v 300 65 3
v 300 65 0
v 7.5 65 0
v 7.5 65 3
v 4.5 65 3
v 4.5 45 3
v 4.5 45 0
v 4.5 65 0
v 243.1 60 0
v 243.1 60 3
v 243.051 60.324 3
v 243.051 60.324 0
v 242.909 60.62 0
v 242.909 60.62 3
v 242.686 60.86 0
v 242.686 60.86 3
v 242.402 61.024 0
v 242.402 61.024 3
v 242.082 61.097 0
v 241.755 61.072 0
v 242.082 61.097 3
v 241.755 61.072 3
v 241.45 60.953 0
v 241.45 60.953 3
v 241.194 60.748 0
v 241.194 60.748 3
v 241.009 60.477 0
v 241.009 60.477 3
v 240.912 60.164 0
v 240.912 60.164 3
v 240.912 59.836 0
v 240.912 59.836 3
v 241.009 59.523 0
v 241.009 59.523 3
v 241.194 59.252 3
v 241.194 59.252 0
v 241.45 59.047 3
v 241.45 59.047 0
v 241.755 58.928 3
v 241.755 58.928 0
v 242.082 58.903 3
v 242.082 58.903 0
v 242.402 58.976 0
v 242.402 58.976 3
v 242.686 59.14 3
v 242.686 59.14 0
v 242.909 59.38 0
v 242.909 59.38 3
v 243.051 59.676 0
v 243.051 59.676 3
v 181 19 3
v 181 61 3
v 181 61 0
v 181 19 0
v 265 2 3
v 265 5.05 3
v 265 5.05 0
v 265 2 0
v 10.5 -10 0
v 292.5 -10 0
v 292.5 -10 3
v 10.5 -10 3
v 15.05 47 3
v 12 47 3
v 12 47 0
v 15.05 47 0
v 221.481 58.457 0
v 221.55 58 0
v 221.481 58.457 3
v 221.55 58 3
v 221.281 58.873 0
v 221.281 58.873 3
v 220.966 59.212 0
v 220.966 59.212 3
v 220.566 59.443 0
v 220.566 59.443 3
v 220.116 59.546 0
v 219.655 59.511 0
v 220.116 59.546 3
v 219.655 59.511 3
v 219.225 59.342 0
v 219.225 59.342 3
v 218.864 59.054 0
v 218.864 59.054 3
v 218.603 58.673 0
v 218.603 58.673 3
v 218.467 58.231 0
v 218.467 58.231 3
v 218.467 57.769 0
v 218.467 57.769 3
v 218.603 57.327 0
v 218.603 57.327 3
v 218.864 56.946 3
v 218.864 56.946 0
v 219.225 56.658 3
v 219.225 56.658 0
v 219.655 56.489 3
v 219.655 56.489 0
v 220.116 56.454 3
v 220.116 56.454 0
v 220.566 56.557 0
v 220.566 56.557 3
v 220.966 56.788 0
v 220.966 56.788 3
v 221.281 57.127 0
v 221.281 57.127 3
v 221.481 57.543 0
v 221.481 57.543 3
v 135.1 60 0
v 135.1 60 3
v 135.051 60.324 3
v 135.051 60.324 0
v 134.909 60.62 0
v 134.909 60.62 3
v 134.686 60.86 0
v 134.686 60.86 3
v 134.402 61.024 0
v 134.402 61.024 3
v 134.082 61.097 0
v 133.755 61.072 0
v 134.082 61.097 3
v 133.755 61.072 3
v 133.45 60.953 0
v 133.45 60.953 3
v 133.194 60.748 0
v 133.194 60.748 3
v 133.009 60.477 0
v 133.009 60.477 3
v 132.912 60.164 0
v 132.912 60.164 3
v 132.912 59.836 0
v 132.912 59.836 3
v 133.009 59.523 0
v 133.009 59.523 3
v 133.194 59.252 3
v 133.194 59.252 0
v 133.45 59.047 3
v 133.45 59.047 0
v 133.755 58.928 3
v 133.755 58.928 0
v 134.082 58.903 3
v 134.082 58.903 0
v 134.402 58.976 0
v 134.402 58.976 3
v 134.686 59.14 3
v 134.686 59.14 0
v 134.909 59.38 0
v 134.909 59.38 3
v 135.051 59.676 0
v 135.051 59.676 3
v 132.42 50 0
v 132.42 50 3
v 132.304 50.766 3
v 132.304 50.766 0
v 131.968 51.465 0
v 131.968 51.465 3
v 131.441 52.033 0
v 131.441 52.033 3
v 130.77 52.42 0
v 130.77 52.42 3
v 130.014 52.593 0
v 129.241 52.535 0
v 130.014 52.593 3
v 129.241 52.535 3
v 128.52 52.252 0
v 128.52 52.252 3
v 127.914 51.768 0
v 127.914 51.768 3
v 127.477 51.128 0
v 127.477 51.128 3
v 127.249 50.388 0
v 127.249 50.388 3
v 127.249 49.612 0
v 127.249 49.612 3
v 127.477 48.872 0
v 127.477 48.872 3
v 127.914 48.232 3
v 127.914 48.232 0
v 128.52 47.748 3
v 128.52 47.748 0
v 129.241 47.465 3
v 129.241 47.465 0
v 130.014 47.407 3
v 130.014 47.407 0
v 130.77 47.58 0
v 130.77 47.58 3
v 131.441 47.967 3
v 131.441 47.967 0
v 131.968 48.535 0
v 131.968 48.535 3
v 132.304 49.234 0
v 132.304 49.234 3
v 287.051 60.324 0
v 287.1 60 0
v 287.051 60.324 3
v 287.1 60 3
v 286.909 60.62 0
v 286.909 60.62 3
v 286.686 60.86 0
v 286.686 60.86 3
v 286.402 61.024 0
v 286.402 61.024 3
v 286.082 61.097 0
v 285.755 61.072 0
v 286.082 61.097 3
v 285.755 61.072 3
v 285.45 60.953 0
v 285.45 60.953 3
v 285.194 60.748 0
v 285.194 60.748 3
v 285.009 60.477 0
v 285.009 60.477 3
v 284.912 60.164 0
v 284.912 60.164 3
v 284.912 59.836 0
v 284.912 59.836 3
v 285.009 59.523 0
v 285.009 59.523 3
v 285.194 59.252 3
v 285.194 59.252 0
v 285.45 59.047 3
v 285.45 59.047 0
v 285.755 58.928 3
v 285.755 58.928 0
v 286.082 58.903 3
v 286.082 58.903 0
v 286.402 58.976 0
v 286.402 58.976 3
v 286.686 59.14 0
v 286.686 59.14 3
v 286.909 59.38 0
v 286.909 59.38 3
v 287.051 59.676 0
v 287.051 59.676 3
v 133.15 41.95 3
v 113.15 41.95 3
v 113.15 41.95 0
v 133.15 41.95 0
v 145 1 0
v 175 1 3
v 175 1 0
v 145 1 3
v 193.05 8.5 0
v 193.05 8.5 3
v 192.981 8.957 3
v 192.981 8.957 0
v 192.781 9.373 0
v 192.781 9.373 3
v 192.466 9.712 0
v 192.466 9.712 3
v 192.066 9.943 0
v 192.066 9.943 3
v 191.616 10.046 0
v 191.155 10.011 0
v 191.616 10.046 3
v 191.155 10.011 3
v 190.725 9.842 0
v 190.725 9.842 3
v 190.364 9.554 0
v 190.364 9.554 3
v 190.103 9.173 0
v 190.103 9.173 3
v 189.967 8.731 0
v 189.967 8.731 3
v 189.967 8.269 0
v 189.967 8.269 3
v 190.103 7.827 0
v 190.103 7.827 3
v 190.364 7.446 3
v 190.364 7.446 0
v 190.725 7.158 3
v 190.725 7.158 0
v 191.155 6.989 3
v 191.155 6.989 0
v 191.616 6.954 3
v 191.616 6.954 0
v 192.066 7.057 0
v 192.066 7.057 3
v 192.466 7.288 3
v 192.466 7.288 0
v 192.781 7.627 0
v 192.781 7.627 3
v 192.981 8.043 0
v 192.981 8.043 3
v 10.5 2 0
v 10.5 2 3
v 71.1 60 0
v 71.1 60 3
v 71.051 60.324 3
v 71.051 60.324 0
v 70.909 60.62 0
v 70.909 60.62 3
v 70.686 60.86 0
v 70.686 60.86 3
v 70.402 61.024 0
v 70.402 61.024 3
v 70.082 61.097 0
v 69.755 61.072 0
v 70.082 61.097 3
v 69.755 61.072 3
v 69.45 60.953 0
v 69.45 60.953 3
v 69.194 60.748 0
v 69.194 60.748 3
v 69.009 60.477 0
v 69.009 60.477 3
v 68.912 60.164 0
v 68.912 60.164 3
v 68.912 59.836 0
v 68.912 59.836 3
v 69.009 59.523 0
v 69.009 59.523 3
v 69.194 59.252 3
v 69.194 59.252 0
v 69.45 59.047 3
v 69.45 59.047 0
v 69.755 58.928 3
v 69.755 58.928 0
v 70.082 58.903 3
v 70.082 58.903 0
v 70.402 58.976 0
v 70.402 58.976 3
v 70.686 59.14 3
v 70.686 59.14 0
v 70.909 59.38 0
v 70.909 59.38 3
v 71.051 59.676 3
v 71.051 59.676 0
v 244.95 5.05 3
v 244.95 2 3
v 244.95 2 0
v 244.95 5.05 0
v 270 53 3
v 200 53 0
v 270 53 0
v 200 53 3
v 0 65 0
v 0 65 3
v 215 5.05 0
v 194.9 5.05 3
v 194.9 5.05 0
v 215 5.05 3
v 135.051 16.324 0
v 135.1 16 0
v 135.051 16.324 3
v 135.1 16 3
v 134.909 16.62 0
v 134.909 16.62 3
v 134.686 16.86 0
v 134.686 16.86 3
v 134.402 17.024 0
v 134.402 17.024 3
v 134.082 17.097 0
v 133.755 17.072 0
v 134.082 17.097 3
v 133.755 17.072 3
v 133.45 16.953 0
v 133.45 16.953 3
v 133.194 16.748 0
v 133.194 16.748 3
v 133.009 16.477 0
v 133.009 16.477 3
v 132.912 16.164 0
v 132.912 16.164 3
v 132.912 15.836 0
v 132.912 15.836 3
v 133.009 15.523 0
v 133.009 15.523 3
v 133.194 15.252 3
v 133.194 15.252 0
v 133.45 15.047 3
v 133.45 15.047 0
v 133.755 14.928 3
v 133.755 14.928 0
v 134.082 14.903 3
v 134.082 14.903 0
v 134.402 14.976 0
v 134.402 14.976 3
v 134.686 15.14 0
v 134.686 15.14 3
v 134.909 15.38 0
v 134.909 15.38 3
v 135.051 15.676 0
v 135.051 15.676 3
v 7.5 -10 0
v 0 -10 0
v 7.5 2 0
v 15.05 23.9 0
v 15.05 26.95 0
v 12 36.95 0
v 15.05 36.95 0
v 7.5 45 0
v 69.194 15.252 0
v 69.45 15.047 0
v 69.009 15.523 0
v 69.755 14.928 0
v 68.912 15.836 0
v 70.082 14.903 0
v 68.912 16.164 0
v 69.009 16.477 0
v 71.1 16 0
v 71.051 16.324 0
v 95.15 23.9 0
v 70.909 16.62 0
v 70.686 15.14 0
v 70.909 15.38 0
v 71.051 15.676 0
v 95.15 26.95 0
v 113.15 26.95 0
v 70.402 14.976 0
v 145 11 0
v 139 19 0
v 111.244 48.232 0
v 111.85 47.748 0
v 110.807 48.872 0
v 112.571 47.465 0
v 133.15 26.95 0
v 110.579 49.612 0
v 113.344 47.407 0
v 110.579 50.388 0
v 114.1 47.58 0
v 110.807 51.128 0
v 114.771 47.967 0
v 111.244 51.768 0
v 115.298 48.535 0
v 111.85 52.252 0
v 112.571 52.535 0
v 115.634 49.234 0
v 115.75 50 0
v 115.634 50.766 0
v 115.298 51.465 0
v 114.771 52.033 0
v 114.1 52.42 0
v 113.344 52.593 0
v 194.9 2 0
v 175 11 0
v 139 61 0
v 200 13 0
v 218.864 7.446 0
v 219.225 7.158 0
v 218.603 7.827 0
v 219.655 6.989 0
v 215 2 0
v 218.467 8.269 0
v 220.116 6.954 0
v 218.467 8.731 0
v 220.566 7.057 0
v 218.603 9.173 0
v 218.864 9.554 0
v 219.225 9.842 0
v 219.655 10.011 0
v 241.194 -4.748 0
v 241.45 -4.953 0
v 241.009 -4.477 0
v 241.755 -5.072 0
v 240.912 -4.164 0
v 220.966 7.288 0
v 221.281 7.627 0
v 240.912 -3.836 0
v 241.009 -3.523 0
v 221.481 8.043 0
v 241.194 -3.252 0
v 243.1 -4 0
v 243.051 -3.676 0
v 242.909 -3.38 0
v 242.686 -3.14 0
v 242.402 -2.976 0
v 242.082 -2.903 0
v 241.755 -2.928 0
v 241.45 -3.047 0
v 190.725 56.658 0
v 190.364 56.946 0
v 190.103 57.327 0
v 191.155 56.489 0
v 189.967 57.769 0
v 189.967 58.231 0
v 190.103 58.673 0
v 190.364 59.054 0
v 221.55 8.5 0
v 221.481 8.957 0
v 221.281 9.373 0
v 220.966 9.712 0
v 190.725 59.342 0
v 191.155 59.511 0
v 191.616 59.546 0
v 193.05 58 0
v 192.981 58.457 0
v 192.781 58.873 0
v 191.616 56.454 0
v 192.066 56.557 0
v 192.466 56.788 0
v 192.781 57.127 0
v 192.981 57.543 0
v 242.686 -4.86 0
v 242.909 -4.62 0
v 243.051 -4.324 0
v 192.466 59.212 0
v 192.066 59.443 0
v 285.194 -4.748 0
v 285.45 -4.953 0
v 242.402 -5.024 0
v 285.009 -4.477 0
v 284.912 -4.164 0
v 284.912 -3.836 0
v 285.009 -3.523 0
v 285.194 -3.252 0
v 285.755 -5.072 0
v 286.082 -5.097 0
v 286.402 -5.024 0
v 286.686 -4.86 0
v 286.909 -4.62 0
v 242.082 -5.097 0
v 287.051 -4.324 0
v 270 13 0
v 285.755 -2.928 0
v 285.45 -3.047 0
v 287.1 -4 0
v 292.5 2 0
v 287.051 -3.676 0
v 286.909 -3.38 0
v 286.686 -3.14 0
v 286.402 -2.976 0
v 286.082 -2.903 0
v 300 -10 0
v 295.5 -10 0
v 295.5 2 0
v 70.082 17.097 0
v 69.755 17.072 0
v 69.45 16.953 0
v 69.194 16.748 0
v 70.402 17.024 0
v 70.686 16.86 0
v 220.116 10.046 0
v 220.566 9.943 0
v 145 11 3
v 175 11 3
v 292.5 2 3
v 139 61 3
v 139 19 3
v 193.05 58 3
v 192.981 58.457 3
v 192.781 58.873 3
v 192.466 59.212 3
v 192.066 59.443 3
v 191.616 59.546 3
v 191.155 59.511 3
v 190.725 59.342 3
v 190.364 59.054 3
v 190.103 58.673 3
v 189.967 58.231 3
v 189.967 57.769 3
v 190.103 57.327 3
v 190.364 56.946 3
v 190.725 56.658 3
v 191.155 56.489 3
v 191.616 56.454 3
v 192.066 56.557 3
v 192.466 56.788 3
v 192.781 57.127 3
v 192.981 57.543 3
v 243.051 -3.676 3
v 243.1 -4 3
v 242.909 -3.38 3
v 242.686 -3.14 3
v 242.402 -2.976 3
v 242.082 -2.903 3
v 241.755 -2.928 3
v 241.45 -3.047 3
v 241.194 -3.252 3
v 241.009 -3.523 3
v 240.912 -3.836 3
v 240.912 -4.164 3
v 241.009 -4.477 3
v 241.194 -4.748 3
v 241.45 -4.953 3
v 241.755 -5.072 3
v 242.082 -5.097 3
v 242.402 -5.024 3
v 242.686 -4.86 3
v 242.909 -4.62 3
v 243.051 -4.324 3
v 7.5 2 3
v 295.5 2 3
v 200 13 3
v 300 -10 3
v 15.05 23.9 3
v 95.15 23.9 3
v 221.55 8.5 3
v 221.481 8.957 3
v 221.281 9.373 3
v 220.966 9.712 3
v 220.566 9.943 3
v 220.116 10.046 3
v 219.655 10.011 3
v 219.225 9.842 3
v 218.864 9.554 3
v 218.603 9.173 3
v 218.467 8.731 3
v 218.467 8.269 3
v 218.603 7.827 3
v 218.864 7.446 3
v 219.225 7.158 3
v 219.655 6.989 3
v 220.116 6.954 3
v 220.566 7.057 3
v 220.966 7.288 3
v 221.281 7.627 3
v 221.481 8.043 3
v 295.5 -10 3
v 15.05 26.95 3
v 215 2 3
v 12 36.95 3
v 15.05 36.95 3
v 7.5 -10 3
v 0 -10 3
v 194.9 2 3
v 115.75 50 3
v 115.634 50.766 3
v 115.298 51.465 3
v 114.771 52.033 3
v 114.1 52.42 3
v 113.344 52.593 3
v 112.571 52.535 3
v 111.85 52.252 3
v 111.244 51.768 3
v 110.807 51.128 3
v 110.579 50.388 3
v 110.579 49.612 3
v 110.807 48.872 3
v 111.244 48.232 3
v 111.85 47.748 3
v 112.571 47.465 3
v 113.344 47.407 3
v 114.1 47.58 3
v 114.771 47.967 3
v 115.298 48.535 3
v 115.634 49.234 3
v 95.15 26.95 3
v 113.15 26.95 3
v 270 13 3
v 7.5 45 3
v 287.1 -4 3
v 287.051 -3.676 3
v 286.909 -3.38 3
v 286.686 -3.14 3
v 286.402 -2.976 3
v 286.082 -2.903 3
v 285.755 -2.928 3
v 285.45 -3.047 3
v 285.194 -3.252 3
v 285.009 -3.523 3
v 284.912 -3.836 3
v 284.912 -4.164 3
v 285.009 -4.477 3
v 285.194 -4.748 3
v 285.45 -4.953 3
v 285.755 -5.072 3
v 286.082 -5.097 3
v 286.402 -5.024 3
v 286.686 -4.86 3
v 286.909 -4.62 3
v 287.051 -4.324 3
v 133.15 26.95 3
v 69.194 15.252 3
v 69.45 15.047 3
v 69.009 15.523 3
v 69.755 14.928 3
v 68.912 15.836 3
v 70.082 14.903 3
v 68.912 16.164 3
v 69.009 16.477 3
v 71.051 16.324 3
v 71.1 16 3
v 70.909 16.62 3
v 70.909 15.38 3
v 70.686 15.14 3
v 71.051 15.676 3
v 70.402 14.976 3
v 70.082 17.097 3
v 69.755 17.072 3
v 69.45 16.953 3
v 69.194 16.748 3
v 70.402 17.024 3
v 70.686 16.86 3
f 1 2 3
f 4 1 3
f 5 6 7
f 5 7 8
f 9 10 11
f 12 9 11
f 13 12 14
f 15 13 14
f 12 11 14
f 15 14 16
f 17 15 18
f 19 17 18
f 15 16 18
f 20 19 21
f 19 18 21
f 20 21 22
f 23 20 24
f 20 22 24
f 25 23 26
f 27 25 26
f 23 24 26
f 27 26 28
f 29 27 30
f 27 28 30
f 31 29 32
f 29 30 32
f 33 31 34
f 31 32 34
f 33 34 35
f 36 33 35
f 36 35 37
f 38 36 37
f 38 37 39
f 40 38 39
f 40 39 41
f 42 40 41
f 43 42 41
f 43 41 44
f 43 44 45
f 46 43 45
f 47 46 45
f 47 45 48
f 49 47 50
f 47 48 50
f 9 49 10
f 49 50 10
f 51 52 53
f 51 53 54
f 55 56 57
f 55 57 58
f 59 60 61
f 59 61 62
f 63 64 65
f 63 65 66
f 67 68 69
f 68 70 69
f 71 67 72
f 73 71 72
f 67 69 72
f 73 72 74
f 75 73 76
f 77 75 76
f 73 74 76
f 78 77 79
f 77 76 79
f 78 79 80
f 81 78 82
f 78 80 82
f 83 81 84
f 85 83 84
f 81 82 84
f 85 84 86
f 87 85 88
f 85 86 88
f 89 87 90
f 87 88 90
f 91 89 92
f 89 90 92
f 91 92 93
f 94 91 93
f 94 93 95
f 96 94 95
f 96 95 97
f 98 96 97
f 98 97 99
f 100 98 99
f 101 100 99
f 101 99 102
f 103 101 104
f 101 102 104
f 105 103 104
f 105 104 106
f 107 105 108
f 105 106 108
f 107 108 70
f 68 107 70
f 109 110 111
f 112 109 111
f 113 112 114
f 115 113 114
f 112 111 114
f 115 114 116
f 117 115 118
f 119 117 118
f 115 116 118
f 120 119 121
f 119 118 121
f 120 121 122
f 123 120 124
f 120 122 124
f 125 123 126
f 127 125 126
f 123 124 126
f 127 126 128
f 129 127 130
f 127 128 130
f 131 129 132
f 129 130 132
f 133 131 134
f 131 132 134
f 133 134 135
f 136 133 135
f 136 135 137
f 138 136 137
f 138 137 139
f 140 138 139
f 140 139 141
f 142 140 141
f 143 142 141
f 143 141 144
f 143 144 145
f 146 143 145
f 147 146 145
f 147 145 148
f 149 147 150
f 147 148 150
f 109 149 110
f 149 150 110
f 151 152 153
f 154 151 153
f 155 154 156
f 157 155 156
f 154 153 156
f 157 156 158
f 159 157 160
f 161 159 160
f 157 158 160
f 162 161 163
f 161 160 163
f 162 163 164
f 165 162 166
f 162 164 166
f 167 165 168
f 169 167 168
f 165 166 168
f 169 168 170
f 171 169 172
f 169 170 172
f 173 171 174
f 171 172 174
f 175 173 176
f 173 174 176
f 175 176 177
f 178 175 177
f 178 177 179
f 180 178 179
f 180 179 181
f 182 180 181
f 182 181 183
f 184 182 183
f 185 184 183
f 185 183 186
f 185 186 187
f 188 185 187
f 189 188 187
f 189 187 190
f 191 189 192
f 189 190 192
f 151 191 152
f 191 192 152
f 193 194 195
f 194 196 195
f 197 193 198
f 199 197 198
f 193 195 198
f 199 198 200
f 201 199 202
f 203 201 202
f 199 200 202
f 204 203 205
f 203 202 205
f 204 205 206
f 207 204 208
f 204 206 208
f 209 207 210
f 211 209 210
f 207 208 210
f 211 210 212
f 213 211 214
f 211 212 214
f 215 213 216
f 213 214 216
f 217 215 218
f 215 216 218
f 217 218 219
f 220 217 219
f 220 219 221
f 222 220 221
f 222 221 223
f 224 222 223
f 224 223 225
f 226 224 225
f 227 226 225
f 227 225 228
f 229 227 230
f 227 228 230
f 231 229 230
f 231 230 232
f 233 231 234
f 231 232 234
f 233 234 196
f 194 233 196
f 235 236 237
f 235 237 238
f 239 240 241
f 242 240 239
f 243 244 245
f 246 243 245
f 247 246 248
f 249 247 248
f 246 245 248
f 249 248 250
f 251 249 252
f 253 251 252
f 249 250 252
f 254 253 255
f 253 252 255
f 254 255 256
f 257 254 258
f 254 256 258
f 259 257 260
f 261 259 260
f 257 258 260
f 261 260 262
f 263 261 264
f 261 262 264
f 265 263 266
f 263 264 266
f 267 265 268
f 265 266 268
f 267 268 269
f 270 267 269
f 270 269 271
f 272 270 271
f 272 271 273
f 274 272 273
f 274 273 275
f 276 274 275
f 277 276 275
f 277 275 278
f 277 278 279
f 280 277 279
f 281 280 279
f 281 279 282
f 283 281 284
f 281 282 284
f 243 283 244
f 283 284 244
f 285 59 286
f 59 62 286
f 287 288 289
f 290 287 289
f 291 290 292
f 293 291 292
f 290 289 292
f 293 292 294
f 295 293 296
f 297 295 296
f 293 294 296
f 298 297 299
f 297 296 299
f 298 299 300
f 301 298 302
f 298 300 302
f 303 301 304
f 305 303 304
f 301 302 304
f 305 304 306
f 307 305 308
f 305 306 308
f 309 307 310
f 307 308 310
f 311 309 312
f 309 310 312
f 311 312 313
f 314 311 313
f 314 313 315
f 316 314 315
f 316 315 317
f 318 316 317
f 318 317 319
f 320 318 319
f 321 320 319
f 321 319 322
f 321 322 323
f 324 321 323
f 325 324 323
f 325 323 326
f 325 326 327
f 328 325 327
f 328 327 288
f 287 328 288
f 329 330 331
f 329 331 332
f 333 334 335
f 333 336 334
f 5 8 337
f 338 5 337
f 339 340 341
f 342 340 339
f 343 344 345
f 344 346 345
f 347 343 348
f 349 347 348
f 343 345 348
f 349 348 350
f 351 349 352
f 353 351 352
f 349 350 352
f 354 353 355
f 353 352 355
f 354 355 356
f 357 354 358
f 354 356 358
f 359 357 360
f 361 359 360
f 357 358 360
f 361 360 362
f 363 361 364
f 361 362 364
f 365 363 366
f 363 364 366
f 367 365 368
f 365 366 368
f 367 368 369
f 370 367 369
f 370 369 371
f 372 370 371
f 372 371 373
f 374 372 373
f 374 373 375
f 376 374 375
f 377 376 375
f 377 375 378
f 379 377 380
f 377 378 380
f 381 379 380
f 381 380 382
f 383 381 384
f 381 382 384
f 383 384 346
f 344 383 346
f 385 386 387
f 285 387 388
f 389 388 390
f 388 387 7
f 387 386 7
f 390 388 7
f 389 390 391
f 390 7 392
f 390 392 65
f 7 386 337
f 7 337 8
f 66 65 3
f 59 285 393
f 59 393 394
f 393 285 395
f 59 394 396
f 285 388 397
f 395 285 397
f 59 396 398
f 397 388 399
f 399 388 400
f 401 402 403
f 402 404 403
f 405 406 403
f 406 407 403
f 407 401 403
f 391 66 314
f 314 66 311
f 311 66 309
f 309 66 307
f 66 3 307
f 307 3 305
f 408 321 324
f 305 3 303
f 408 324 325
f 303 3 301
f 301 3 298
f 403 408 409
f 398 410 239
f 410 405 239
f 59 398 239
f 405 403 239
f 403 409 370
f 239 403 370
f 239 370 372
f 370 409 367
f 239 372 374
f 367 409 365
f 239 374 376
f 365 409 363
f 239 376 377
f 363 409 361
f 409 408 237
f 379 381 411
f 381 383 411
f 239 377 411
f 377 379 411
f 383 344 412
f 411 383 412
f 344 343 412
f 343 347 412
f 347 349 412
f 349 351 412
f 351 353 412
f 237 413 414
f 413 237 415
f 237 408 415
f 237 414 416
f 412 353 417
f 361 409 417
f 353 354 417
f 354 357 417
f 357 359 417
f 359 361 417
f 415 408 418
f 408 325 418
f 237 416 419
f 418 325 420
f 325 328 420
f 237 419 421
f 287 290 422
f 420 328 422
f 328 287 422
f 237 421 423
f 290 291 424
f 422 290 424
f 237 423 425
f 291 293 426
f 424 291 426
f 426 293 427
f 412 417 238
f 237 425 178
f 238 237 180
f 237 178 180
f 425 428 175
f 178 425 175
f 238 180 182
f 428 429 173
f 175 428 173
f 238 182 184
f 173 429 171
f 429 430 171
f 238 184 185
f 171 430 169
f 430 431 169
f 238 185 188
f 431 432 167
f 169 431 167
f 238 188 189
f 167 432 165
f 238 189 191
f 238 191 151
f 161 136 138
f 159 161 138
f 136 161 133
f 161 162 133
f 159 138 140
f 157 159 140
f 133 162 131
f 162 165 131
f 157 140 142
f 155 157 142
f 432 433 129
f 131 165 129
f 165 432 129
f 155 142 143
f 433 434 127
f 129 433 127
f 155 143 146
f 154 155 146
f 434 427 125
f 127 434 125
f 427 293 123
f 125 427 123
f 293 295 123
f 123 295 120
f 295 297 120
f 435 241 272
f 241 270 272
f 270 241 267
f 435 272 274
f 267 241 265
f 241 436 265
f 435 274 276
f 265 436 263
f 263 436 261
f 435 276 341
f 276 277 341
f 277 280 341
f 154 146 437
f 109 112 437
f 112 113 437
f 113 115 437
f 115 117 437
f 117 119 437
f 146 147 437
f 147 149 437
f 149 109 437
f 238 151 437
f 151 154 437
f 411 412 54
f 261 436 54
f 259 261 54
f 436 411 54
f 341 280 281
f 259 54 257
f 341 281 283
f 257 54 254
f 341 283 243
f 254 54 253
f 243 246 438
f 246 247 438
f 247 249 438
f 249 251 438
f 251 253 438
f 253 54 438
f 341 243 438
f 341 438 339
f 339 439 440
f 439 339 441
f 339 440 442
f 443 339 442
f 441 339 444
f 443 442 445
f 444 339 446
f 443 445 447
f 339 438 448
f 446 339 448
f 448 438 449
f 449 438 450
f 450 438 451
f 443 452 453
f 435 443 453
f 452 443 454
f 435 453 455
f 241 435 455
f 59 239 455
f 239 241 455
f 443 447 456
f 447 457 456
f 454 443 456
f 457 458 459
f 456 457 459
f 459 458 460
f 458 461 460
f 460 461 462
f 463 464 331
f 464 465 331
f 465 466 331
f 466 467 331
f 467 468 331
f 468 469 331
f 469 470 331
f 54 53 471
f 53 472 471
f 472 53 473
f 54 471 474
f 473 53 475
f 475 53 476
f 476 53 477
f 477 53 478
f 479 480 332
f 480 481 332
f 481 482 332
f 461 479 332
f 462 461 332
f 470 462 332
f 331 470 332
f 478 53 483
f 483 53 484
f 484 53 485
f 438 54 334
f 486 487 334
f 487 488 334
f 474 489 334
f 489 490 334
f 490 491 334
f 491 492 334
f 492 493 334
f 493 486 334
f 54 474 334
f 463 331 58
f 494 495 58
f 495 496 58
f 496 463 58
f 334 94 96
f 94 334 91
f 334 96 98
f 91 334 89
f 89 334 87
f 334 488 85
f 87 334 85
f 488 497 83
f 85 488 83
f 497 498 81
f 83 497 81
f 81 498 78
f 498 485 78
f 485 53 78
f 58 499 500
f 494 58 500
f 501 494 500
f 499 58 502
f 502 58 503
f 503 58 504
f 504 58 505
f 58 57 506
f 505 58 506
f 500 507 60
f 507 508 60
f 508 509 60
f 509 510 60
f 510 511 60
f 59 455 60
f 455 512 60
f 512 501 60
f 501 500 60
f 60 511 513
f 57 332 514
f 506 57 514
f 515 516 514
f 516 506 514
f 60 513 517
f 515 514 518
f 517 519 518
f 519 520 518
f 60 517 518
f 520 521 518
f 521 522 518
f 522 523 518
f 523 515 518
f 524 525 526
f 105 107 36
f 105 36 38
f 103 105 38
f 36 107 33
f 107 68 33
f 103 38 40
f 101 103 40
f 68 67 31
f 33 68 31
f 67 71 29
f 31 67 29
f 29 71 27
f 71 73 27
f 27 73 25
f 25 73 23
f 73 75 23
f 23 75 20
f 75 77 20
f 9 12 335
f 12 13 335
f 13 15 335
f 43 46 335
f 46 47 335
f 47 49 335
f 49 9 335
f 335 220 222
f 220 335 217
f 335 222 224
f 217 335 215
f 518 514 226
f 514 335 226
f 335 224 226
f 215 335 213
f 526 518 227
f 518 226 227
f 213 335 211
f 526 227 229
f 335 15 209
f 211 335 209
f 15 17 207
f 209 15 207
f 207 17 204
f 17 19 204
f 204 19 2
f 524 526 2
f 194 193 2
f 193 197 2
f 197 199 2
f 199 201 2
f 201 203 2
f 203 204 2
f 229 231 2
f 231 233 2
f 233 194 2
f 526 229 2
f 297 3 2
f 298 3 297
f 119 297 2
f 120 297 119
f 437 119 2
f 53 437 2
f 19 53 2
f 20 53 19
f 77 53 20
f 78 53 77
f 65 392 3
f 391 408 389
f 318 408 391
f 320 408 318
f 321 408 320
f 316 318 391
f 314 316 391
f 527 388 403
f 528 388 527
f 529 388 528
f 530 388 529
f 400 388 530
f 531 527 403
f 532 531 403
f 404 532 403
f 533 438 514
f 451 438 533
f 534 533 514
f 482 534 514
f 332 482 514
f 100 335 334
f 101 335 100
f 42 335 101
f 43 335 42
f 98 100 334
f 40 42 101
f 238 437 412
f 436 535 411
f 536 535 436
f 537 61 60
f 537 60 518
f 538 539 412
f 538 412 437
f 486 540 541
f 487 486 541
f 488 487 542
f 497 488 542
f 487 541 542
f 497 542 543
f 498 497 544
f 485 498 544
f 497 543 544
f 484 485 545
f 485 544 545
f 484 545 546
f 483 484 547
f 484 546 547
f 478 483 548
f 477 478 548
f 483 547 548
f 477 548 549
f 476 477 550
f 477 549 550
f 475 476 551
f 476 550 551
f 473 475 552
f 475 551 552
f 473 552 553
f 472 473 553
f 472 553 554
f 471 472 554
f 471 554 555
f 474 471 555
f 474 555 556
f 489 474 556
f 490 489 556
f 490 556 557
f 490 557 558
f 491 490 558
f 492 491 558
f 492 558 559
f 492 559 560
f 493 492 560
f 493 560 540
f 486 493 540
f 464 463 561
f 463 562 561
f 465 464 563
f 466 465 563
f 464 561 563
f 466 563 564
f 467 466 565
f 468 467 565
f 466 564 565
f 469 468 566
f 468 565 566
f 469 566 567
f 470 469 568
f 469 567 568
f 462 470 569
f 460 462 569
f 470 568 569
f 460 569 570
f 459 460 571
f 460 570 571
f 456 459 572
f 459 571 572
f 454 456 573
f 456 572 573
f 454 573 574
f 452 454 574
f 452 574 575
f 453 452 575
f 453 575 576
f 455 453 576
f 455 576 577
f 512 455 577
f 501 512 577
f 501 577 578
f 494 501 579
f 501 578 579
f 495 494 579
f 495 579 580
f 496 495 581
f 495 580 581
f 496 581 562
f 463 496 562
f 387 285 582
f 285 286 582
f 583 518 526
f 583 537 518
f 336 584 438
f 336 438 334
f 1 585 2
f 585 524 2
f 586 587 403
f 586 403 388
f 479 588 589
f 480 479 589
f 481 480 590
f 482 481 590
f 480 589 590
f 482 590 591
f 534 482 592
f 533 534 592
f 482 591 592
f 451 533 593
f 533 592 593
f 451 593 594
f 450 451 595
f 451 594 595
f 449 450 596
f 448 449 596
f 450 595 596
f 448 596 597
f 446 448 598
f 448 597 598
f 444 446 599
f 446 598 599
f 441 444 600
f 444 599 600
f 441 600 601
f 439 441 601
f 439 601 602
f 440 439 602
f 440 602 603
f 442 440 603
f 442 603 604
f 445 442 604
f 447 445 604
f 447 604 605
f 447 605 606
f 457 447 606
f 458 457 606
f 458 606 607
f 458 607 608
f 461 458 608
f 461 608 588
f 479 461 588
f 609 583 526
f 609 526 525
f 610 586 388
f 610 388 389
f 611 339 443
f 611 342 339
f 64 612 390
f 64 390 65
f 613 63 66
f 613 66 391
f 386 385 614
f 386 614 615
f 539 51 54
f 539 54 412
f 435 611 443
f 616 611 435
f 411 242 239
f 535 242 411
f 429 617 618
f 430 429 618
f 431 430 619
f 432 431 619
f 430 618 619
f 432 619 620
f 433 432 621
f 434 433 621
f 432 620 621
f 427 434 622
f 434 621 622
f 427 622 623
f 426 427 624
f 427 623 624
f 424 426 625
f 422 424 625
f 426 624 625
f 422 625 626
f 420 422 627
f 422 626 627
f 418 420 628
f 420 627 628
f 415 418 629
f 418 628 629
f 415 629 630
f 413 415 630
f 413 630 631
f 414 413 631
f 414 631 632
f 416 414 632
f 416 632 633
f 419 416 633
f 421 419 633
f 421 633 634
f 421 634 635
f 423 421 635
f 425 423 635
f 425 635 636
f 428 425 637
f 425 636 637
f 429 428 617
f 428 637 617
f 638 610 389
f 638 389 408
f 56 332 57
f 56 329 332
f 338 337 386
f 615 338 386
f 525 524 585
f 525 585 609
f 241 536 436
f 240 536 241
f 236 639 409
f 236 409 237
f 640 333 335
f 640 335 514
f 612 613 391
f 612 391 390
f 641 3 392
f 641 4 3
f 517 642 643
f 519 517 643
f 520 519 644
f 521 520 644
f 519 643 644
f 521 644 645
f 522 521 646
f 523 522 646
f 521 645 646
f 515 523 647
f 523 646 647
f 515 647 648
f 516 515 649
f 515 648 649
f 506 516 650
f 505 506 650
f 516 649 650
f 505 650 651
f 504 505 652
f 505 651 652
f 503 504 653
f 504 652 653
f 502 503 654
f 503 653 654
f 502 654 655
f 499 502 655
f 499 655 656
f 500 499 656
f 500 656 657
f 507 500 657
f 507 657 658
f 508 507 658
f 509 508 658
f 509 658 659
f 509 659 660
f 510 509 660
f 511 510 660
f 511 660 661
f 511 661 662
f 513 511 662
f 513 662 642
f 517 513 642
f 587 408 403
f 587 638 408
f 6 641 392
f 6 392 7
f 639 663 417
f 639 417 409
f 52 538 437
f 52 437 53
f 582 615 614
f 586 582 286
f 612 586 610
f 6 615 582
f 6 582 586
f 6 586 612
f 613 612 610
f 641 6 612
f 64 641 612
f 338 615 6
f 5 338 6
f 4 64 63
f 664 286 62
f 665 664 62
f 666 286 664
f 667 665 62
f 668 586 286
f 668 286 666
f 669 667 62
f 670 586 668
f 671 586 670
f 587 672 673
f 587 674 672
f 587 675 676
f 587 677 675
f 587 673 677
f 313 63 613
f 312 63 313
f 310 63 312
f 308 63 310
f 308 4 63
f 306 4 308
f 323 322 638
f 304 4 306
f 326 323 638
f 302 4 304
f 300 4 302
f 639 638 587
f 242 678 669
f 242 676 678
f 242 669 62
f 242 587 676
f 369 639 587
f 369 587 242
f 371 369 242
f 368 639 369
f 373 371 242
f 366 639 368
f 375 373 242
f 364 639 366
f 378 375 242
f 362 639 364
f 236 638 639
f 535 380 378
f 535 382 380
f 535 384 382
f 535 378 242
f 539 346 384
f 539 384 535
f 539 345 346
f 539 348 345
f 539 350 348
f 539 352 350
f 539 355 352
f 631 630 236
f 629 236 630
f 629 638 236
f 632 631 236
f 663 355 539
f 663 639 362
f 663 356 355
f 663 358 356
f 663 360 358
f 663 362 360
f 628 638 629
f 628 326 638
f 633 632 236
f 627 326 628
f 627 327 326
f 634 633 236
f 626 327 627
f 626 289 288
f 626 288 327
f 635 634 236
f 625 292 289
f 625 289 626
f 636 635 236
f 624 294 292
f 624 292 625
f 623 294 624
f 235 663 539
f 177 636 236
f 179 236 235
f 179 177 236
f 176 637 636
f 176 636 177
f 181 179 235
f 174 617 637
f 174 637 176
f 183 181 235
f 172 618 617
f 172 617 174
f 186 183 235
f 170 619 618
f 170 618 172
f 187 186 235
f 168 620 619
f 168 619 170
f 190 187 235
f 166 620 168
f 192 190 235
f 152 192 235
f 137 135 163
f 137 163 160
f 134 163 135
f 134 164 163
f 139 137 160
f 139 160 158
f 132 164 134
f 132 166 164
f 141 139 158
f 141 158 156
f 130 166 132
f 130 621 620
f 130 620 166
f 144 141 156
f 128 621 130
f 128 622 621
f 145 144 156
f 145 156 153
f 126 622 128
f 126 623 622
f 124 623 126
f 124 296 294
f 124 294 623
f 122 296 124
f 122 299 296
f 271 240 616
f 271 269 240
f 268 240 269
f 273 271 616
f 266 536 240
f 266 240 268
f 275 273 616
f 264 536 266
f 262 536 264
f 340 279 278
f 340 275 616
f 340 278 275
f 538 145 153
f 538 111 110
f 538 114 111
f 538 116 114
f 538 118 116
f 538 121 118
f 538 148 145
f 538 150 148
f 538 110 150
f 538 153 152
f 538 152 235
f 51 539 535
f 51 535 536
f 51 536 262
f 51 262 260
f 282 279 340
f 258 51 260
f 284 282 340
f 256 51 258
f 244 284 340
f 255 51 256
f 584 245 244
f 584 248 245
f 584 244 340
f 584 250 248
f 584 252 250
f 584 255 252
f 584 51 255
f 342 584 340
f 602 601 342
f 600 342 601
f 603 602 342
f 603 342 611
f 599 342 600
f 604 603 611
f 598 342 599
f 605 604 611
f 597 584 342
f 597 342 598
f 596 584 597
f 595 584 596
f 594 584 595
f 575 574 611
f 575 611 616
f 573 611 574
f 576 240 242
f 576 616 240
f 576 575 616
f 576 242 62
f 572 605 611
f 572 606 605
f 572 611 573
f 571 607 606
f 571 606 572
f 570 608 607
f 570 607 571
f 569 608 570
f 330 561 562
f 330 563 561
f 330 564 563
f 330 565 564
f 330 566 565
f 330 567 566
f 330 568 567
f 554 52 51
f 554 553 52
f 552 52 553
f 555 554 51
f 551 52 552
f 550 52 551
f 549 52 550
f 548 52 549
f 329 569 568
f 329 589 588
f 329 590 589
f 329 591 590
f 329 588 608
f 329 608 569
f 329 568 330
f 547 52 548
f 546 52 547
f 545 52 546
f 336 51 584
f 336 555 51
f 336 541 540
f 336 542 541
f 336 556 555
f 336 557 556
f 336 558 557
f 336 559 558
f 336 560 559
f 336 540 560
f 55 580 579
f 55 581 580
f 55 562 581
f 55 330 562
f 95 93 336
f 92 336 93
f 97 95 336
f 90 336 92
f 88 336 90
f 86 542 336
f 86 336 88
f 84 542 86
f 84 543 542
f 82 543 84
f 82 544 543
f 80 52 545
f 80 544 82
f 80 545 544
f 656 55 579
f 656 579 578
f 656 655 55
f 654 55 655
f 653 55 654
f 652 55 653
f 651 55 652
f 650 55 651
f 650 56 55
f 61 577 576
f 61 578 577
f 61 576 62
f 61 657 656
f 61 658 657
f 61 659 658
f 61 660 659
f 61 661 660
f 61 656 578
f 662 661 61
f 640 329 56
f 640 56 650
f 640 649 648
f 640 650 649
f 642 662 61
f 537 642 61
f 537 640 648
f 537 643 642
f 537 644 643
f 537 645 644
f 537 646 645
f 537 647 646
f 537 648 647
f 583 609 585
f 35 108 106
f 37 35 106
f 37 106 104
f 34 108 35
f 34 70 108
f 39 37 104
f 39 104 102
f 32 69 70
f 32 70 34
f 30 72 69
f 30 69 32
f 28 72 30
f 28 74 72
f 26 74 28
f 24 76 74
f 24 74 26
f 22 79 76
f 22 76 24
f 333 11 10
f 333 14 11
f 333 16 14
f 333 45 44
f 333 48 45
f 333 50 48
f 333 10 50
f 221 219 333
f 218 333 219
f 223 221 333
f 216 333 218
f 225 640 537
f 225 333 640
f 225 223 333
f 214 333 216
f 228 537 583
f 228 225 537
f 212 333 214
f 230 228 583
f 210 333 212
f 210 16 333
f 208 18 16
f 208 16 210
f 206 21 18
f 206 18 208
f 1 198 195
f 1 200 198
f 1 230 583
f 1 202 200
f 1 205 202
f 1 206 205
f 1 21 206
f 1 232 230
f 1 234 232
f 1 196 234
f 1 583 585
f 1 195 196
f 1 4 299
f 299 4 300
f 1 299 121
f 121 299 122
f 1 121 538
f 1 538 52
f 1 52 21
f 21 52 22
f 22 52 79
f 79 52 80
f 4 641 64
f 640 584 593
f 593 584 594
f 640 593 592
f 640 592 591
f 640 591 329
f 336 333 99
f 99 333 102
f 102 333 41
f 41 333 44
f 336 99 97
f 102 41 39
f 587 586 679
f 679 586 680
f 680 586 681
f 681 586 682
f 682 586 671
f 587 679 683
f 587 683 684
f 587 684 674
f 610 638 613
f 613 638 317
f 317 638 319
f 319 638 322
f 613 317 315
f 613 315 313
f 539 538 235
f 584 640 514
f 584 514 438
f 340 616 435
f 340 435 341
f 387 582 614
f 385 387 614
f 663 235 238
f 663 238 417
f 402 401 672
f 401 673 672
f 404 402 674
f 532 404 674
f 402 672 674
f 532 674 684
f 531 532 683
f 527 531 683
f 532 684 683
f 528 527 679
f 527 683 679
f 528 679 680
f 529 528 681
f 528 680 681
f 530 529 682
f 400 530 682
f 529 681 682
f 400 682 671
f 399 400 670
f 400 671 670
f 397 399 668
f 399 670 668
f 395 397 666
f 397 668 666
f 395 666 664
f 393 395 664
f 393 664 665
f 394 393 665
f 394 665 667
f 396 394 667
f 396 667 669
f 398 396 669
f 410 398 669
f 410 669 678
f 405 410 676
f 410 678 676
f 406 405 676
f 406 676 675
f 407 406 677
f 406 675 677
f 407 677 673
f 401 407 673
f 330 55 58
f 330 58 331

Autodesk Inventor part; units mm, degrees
ref_plane "YZ Plane" through (0, 0, 0) normal (1, 0, 0) x (0, 1, 0)
ref_plane "XZ Plane" through (0, 0, 0) normal (0, 1, 0) x (-1, 0, 0)
ref_plane "XY Plane" through (0, 0, 0) normal (0, 0, 1) x (1, 0, 0)
sketch "Sketch1" plane through (0, 0, 0) normal (0, 0, 1) x (1, 0, 0)
  line L0 (0, 0) -> (300, 0)
  line L1 (300, 0) -> (300, 65)
  line L2 (300, 65) -> (0, 65)
  line L3 (0, 65) -> (0, 0)
  line L4 (0, 0) -> (300, 0)
  line L5 (300, 0) -> (300, -10)
  line L6 (300, -10) -> (0, -10)
  line L7 (0, -10) -> (0, 0)
  dimension "d0" = 300
  dimension "d1" = 65
  dimension "d2" = 10
extrude "Extrusion1" add sketch "Sketch1" along normal blind 3
sketch "Sketch3" plane through (0, 0, 3) normal (0, 0, 1) x (1, 0, 0)
  line L0 (139, 61) -> (181, 61)
  line L1 (181, 61) -> (181, 19)
  line L2 (181, 19) -> (139, 19)
  line L3 (139, 19) -> (139, 61)
  line L4 (139, 61) -> (181, 19) construction
  line L5 (181, 61) -> (139, 19) construction
  line L6 (300, -10) -> (300, 65) projected
  line L7 (300, 65) -> (0, 65) projected
  line L8 (0, 65) -> (0, -10) projected
  line L9 (145, 11) -> (175, 11)
  line L10 (175, 11) -> (175, 1)
  line L11 (175, 1) -> (145, 1)
  line L12 (145, 1) -> (145, 11)
  line L13 (145, 11) -> (175, 1) construction
  line L14 (175, 11) -> (145, 1) construction
  point P0 (0, 0)
  point P1 (160, 40)
  point P2 (160, 6)
  dimension "d12" = 25
  dimension "d13" = 42
  dimension "d14" = 42
  dimension "d19" = 160
  dimension "d57" = 8
  dimension "d58" = 30
  dimension "d59" = 10
extrude "Extrusion2" cut sketch "Sketch3" against normal blind 3
sketch "Sketch2" plane through (0, 0, 3) normal (0, 0, 1) x (1, 0, 0)
  line L0 (0, -10) -> (300, -10) projected
  line L1 (7.5, -10) -> (10.5, -10)
  line L2 (10.5, -10) -> (10.5, 2)
  line L3 (10.5, 2) -> (7.5, 2)
  line L4 (7.5, 2) -> (7.5, -10)
  line L5 (295.5, -10) -> (292.5, -10)
  line L6 (292.5, -10) -> (292.5, 2)
  line L7 (292.5, 2) -> (295.5, 2)
  line L8 (295.5, 2) -> (295.5, -10)
  line L9 (300, 65) -> (0, 65) projected
  line L10 (4.5, 65) -> (7.5, 65)
  line L11 (7.5, 65) -> (7.5, 45)
  line L12 (7.5, 45) -> (4.5, 45)
  line L13 (4.5, 45) -> (4.5, 65)
  line L14 (0, 65) -> (0, -10) projected
  point P0 (0, 0)
  point P1 (294, 2)
  dimension "d6" = 12
  dimension "d7" = 3
  dimension "d8" = 6
  dimension "d9" = 3
  dimension "d53" = 20
  dimension "d54" = 3
  dimension "d88" = 4.5
extrude "Extrusion3" cut sketch "Sketch2" against normal blind 3
sketch "Sketch4" plane through (0, 0, 3) normal (0, 0, 1) x (1, 0, 0)
  line L0 (15.05, 26.95) -> (95.15, 26.95)
  line L1 (95.15, 26.95) -> (95.15, 23.9)
  line L2 (95.15, 23.9) -> (15.05, 23.9)
  line L3 (15.05, 23.9) -> (15.05, 26.95)
  line L4 (12, 47) -> (15.05, 47)
  line L5 (15.05, 47) -> (15.05, 36.95)
  line L6 (15.05, 36.95) -> (12, 36.95)
  line L7 (12, 36.95) -> (12, 47)
  line L8 (0, 65) -> (0, -10) projected
  circle A0 centre (113.15, 50) radius 2.6
  circle A1 centre (129.8199, 50) radius 2.6
  line L9 (300, 65) -> (7.5, 65) projected
  line L10 (113.15, 41.95) -> (133.15, 41.95)
  line L11 (133.15, 41.95) -> (133.15, 26.95)
  line L12 (133.15, 26.95) -> (113.15, 26.95)
  line L13 (113.15, 26.95) -> (113.15, 41.95)
  point P0 (0, 0)
  point P1 (139, 19)
  dimension "d20" = 80.1
  dimension "d21" = 3.05
  dimension "d22" = 3.05
  dimension "d23" = 10.05
  dimension "d28" = 12
  dimension "d56" = 18
  dimension "d60" = 10
  dimension "d77" = 5.2
  dimension "d78" = 5.2
  dimension "d79" = 15
  dimension "d80" = 20
  dimension "d81" = 15
  dimension "d82" = 18
extrude "Extrusion4" cut sketch "Sketch4" against normal blind 3
sketch "Sketch5" plane through (0, 0, 3) normal (0, 0, 1) x (1, 0, 0)
  circle A0 centre (191.5, 58) radius 1.55
  circle A1 centre (220, 58) radius 1.55
  circle A2 centre (220, 8.5) radius 1.55
  circle A3 centre (191.5, 8.5) radius 1.55
  line L0 (300, -10) -> (300, 65) projected
  point P0 (0, 0)
  dimension "d31" = 28.5
  dimension "d32" = 49.5
  dimension "d33" = 3.1
  dimension "d34" = 3.1
  dimension "d35" = 3.1
  dimension "d36" = 3.1
  dimension "d37" = 80
  dimension "d38" = 7
extrude "Extrusion5" cut sketch "Sketch5" against normal blind 3
sketch "Sketch6" plane through (0, 0, 3) normal (0, 0, 1) x (1, 0, 0)
  circle A0 centre (242, 60) radius 1.1
  circle A1 centre (286, 60) radius 1.1
  circle A2 centre (286, -4) radius 1.1
  circle A3 centre (242, -4) radius 1.1
  circle A4 centre (220, 58) radius 1.55 projected
  circle A5 centre (70, 60) radius 1.1
  circle A6 centre (134, 60) radius 1.1
  circle A7 centre (134, 16) radius 1.1
  circle A8 centre (70, 16) radius 1.1
  point P0 (0, 0)
  point P1 (300, 65)
  point P2 (0, 65)
  dimension "d41" = 2.2
  dimension "d42" = 2.2
  dimension "d43" = 2.2
  dimension "d44" = 2.2
  dimension "d45" = 64
  dimension "d46" = 44
  dimension "d50" = 5
  dimension "d51" = 14
  dimension "d61" = 64
  dimension "d62" = 44
  dimension "d63" = 2.2
  dimension "d64" = 2.2
  dimension "d65" = 2.2
  dimension "d66" = 2.2
  dimension "d67" = 70
  dimension "d68" = 5
extrude "Extrusion6" cut sketch "Sketch6" against normal blind 3 contours A0 | A1 | A2 | A3 | A5 | A6 | A7 | A8
sketch "Sketch7" plane through (0, 0, 3) normal (0, 0, 1) x (1, 0, 0)
  line L0 (244.95, 5.05) -> (265, 5.05)
  line L1 (265, 5.05) -> (265, 2)
  line L2 (265, 2) -> (244.95, 2)
  line L3 (244.95, 2) -> (244.95, 5.05)
  line L4 (194.9, 5.05) -> (215, 5.05)
  line L5 (215, 5.05) -> (215, 2)
  line L6 (215, 2) -> (194.9, 2)
  line L7 (194.9, 2) -> (194.9, 5.05)
  line L8 (300, -10) -> (300, 65) projected
  line L9 (200, 53) -> (270, 53)
  line L10 (270, 53) -> (270, 13)
  line L11 (270, 13) -> (200, 13)
  line L12 (200, 13) -> (200, 53)
  line L13 (300, 65) -> (7.5, 65) projected
  point P0 (0, 0)
  dimension "d69" = 20.05
  dimension "d70" = 3.05
  dimension "d73" = 20.1
  dimension "d74" = 29.95
  dimension "d75" = 35
  dimension "d76" = 12
  dimension "d83" = 70
  dimension "d84" = 40
  dimension "d85" = 12
  dimension "d86" = 30
extrude "Extrusion7" cut sketch "Sketch7" against normal blind 3
properties part number "2ndSideboard"
